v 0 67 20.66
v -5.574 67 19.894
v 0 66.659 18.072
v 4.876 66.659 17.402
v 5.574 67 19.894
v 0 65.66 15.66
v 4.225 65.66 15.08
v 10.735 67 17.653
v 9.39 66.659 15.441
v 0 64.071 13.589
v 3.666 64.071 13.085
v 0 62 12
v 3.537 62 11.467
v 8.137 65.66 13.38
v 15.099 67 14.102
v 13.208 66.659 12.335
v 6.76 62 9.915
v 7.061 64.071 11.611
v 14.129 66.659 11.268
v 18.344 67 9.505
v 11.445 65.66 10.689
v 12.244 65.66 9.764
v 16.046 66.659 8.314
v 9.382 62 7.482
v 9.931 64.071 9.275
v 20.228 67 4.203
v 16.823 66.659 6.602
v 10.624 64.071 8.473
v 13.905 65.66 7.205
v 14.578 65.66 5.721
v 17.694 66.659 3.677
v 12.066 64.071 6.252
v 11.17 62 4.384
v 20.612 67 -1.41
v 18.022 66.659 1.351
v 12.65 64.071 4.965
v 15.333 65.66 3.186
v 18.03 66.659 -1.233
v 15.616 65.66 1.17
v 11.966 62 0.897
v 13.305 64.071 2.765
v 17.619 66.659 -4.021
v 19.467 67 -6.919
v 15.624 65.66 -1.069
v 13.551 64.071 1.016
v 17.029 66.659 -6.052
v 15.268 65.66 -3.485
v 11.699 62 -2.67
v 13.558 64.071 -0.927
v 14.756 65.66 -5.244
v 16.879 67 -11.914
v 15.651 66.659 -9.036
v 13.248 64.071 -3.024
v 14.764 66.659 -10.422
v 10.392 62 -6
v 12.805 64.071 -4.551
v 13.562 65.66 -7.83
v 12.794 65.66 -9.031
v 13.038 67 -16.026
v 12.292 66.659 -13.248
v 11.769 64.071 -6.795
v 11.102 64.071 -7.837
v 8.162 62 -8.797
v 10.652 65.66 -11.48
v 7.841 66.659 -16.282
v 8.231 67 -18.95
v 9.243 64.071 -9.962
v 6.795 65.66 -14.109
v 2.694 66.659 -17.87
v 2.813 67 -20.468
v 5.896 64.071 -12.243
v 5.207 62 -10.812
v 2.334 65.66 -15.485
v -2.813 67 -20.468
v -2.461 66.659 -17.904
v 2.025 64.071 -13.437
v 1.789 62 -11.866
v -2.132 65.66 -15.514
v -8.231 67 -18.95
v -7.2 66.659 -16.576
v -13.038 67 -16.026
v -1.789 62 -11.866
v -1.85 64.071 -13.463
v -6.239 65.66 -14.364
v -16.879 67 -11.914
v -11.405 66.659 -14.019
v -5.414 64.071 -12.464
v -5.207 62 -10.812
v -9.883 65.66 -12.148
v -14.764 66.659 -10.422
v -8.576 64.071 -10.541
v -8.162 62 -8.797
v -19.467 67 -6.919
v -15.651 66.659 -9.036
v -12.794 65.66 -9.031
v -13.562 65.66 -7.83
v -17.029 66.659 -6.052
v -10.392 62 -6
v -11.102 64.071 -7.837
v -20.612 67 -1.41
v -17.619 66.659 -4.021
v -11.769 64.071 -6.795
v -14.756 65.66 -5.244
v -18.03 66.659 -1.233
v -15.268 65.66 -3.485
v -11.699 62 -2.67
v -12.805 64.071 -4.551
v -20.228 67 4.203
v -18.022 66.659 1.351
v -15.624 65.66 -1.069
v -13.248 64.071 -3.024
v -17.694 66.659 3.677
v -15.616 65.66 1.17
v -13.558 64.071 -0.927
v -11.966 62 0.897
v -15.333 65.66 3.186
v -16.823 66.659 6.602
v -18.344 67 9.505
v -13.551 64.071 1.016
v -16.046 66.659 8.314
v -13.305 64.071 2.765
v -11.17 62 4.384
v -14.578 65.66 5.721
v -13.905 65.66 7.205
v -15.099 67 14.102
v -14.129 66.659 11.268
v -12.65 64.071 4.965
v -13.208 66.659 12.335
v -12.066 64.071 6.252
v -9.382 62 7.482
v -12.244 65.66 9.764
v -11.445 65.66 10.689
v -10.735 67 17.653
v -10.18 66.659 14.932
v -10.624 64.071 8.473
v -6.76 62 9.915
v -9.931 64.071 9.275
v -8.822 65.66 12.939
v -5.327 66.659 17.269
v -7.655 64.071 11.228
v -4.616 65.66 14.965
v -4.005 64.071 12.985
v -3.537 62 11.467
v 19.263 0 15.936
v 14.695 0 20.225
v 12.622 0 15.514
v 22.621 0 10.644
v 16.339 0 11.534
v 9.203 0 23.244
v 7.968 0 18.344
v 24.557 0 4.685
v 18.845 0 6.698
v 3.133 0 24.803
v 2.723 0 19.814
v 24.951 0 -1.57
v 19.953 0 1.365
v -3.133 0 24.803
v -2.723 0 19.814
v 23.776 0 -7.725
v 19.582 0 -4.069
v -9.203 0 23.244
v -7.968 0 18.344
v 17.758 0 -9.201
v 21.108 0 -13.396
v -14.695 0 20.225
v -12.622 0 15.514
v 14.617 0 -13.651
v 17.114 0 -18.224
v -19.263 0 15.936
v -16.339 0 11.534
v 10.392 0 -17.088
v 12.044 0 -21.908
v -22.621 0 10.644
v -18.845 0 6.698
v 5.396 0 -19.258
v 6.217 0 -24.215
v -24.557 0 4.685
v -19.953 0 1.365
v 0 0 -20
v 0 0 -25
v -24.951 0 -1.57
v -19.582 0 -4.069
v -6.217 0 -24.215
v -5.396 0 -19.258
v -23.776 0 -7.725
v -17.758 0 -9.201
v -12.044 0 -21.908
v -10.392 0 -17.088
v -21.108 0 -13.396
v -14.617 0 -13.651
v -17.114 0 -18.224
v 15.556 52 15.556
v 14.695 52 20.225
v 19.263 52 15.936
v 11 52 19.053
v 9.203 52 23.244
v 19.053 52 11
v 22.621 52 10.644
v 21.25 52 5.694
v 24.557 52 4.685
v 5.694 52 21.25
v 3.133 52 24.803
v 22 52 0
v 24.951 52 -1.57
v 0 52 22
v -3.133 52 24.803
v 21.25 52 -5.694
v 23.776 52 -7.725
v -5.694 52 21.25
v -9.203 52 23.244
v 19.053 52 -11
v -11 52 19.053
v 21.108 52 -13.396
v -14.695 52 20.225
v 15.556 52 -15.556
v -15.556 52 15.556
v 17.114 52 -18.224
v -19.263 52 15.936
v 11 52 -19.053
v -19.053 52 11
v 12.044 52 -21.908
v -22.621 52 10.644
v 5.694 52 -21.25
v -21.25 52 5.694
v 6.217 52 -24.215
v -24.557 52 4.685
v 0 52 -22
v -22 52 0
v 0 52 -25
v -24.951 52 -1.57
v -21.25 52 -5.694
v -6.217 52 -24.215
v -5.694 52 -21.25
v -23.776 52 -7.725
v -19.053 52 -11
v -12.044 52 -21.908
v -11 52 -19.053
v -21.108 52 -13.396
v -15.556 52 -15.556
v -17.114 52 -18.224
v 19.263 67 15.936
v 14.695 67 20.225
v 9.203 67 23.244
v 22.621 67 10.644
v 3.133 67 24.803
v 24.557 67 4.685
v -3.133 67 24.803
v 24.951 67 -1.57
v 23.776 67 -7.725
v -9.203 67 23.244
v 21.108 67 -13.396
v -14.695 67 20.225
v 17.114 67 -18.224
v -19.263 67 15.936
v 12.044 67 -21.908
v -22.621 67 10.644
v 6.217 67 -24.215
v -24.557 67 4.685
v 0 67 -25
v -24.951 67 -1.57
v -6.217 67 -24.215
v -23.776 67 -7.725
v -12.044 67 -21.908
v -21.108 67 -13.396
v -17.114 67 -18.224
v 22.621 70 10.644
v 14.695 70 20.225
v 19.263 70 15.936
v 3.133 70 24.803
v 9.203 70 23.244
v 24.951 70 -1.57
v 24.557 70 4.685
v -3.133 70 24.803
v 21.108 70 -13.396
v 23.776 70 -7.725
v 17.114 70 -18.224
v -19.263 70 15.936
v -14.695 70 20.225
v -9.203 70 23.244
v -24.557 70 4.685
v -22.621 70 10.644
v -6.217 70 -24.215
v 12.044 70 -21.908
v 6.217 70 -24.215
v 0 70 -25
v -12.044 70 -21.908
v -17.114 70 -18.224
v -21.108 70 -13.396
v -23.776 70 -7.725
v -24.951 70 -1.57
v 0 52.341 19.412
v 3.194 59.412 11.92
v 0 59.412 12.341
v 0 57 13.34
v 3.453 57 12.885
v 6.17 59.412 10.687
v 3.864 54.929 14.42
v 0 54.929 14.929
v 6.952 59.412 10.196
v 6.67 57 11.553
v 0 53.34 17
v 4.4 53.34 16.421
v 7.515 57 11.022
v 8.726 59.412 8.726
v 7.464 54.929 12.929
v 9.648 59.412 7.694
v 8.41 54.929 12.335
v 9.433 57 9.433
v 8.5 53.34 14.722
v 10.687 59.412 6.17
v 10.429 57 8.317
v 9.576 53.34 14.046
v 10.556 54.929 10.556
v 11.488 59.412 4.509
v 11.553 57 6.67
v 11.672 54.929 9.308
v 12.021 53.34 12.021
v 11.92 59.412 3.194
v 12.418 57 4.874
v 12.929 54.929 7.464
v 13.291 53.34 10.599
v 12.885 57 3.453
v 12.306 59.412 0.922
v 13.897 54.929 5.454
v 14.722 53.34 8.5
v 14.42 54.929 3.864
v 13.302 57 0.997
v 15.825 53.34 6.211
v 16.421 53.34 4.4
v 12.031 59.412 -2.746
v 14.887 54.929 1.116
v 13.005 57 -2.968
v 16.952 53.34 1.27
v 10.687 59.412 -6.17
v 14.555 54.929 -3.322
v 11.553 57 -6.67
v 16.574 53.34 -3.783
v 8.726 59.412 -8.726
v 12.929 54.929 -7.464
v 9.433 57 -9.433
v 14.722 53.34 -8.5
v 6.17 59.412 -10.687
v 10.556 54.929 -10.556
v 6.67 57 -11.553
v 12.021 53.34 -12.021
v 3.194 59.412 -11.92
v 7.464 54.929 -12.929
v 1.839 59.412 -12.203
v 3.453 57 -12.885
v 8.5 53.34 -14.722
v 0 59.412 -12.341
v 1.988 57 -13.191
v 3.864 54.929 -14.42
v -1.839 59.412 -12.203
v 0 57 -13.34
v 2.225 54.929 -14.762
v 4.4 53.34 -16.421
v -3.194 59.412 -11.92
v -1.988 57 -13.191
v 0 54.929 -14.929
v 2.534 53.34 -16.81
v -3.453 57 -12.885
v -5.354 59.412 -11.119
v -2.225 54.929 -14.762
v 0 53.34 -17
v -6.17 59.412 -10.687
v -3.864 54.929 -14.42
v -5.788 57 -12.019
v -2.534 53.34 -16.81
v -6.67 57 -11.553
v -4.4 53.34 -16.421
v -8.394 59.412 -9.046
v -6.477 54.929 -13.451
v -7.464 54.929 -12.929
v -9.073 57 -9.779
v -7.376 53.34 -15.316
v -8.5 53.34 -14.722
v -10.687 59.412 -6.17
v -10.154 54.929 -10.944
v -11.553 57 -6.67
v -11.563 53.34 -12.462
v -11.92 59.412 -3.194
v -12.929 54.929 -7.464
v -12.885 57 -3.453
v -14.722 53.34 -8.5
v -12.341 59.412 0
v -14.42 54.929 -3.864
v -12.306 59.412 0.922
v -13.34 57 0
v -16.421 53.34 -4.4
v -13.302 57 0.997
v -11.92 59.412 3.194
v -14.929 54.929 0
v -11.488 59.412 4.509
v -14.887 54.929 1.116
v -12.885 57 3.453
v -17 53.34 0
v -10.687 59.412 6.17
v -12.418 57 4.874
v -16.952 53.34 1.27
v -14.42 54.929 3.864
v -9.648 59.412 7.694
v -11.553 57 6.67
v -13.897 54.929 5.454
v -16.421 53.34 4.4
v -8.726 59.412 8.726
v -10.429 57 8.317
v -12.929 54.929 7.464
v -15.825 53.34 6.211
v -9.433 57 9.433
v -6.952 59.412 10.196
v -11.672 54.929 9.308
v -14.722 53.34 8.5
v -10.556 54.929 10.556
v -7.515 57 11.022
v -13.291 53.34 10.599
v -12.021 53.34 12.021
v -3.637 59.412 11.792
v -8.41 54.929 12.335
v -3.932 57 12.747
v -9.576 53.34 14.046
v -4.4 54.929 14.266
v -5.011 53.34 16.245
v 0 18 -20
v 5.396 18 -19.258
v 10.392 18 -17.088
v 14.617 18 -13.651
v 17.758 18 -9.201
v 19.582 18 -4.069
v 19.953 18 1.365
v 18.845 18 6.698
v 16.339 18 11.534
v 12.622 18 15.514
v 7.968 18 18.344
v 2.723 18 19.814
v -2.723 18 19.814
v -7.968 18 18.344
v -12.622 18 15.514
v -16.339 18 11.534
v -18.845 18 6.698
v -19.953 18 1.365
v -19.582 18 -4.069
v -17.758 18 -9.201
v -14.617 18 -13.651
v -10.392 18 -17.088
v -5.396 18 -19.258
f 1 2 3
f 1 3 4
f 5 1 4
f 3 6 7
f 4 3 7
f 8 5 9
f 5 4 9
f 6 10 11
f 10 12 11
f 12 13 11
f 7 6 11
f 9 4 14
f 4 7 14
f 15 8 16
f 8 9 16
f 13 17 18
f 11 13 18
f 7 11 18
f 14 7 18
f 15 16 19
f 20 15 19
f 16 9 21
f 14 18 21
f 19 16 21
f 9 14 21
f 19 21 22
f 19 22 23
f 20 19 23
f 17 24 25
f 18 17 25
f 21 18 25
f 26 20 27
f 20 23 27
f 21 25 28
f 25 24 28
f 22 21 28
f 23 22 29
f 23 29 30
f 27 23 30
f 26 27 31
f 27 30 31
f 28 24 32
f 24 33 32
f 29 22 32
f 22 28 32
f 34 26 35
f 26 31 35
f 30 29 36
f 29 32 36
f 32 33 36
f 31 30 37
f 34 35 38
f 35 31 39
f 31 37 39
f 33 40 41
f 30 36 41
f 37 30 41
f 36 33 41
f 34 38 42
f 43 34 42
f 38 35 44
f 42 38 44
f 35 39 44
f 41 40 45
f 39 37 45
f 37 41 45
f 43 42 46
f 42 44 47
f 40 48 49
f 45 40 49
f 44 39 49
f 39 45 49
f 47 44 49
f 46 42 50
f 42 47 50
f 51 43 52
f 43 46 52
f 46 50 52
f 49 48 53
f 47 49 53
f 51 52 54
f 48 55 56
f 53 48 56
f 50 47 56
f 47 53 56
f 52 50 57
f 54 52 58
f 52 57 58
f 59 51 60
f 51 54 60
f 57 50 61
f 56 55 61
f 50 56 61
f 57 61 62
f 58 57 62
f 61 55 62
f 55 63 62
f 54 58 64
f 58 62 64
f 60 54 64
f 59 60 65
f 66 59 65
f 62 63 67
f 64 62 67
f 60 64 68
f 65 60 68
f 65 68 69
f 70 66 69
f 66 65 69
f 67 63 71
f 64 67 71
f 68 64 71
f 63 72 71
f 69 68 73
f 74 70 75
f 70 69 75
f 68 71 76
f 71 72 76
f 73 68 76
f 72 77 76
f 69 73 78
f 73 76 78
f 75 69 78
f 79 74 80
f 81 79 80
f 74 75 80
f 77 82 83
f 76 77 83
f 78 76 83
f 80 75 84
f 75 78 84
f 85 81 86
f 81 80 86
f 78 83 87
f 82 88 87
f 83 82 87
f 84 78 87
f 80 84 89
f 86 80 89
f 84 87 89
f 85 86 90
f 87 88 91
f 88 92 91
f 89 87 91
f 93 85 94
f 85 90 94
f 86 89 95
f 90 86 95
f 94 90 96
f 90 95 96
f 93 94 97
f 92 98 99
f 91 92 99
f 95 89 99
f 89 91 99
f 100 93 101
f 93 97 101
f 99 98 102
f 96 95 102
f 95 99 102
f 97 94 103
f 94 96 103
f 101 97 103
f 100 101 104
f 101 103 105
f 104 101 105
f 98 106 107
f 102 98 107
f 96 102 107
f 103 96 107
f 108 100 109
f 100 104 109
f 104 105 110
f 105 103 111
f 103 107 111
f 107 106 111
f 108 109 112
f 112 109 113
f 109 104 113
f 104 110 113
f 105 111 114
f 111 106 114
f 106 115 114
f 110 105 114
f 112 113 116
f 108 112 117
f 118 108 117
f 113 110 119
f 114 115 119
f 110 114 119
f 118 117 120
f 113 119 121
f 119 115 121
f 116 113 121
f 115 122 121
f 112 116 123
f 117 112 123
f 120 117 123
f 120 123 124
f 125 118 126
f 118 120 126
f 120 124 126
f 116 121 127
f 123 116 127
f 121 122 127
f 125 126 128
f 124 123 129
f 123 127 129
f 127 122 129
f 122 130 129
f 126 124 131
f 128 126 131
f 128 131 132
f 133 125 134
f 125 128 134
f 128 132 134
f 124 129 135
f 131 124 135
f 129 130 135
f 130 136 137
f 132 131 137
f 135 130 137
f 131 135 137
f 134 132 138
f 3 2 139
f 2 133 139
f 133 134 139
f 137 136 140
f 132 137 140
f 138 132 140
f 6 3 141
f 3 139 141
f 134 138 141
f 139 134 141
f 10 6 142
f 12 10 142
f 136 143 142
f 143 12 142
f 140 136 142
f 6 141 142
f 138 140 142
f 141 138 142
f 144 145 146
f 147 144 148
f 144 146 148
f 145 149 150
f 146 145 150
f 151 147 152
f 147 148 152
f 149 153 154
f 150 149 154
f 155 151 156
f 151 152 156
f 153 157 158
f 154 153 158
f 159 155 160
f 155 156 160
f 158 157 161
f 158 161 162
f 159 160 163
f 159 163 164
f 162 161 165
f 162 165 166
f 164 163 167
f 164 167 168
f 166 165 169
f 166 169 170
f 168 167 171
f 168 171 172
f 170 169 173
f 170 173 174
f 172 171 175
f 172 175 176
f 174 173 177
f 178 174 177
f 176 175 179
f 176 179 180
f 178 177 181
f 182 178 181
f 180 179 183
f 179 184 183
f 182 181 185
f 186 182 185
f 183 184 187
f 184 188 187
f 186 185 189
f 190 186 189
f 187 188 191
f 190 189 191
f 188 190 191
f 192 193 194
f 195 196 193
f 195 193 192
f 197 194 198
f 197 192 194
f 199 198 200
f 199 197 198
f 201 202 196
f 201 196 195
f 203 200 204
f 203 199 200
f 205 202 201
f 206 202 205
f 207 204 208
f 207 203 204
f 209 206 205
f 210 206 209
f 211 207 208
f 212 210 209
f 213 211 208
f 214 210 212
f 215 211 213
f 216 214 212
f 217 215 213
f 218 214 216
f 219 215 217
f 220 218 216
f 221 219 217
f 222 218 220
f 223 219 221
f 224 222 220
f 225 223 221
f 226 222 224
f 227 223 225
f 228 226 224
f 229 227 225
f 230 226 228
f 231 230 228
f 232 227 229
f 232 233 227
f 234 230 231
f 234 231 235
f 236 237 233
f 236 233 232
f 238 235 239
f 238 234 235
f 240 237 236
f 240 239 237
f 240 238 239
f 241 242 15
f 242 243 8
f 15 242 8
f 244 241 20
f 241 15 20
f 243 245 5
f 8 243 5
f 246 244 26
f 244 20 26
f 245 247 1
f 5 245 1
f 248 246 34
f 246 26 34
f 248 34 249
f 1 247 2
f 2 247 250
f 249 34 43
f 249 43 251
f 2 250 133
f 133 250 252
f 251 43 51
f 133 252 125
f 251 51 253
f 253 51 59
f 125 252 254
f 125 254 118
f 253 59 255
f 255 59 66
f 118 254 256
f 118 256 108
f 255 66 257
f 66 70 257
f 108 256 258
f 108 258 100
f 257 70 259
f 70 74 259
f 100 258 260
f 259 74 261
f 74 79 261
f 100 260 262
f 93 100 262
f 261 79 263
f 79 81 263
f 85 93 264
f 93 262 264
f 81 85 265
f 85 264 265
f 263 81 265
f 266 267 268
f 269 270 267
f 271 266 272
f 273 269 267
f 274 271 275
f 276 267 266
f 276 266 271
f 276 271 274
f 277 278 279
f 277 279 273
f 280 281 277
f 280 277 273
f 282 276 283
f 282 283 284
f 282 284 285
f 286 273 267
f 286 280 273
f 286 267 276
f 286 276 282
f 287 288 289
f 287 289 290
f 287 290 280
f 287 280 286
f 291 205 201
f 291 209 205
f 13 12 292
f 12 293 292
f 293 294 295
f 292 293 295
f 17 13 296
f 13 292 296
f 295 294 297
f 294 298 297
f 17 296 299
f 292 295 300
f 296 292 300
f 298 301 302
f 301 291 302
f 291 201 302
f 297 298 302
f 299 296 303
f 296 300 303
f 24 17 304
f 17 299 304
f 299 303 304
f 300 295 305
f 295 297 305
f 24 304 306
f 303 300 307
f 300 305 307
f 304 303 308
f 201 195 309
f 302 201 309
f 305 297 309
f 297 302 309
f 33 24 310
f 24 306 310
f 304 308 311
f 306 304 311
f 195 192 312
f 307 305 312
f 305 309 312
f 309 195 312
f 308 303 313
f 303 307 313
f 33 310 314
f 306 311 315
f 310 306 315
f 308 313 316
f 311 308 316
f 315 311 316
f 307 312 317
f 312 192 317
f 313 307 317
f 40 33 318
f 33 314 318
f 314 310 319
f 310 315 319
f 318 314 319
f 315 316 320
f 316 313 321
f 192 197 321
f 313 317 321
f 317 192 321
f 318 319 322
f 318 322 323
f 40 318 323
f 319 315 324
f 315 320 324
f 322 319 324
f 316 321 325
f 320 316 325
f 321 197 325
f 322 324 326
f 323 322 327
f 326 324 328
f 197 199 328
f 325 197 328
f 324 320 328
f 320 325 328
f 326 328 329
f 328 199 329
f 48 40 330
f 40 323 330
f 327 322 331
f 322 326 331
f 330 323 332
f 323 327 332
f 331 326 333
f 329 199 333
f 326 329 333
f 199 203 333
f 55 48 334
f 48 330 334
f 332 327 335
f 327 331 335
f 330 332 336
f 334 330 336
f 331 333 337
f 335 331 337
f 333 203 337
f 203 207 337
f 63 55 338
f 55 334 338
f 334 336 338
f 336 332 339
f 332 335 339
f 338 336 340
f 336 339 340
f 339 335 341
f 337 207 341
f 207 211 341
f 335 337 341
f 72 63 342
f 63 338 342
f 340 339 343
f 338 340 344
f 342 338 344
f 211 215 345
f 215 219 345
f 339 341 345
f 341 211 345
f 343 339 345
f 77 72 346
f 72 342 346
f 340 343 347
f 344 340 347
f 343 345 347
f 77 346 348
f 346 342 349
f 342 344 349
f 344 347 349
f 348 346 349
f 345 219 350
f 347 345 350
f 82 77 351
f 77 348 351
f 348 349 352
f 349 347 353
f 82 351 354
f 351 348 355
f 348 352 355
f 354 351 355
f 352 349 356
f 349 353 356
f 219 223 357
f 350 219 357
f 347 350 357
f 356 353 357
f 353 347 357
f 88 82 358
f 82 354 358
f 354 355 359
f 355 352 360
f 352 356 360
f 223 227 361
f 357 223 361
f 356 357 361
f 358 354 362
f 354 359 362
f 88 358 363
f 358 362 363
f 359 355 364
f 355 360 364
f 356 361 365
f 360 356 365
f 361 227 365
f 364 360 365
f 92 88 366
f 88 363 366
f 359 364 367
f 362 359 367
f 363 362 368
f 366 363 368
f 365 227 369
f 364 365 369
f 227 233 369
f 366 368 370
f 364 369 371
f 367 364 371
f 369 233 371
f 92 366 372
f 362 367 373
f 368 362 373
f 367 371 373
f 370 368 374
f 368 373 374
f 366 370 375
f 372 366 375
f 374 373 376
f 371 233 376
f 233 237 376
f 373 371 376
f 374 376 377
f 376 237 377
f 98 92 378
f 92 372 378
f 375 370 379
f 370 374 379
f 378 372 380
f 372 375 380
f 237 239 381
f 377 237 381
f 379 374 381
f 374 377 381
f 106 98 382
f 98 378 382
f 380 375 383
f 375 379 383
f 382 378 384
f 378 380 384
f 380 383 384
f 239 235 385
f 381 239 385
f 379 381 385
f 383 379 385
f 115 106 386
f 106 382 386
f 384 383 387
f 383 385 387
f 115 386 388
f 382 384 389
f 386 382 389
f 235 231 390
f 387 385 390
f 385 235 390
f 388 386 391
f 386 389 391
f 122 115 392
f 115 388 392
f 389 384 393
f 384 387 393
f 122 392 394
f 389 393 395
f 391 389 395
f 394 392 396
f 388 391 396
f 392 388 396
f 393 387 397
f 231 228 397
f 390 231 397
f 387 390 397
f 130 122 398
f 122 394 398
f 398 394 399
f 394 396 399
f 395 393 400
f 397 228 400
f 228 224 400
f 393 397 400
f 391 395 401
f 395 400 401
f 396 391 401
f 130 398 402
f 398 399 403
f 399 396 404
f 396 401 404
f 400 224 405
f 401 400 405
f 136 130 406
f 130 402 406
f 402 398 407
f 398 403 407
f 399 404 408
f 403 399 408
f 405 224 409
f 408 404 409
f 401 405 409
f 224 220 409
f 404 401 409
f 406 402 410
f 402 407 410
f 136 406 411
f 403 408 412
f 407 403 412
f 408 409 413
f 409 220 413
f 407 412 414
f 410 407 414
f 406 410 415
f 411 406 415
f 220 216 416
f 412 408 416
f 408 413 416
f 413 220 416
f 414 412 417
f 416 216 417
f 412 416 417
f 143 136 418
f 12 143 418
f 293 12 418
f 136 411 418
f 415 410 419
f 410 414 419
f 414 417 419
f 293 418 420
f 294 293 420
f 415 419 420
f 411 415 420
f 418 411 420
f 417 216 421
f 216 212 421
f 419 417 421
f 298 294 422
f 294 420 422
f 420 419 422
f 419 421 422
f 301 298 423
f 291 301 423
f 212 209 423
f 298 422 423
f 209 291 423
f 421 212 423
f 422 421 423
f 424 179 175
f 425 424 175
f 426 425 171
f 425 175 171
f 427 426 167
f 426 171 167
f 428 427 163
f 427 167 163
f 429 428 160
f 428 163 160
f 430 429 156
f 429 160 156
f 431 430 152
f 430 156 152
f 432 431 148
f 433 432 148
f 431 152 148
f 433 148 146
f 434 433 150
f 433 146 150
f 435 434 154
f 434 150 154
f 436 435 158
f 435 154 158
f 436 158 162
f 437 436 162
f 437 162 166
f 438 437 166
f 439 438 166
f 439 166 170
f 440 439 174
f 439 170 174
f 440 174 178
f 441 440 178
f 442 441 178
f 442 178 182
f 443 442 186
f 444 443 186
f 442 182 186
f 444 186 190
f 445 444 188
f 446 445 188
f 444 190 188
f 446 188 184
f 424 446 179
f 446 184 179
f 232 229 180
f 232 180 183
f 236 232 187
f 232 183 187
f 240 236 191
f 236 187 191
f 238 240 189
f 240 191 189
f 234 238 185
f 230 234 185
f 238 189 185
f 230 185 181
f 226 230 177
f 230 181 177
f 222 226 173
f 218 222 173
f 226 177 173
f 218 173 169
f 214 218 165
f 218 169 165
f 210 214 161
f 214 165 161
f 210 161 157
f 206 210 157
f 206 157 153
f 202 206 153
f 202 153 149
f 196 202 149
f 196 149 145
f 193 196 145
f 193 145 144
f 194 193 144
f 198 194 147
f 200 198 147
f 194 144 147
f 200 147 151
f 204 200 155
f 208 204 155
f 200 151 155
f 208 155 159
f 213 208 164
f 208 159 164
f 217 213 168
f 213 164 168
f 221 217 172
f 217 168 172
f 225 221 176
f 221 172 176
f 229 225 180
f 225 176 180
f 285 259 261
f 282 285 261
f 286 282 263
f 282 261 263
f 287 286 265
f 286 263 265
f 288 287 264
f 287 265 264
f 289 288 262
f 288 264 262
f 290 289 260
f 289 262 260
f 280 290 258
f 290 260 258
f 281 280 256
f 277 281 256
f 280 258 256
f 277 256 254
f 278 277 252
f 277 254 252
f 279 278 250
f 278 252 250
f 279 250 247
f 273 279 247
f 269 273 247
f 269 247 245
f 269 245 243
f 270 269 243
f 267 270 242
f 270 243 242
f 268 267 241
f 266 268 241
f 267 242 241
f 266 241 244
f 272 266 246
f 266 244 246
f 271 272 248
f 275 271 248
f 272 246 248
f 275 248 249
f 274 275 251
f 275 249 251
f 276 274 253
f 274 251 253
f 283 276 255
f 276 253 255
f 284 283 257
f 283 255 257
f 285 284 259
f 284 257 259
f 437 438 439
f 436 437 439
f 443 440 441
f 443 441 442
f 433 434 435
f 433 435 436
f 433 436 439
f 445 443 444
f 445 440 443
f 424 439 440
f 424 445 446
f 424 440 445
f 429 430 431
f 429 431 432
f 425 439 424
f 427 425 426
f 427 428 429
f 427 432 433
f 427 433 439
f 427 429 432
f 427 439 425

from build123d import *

# Parameters (mm, degrees)
SKETCH1_R           = 25
BOSS_EXTRUDE1_DEPTH = 52
SKETCH2_R           = 12
BOSS_EXTRUDE2_DEPTH = 15
SKETCH3_R           = 25
BOSS_EXTRUDE3_DEPTH = 3
FILLET1_R           = 10
FILLET2_R           = 10
SKETCH4_R           = 20
CUT_EXTRUDE1_DEPTH  = 18


with BuildPart() as part:
    # Sketch1 → Boss-Extrude1 (new body)
    with BuildSketch(Plane(origin=(0, 0, 0), x_dir=(1, 0, 0), z_dir=(0, 1, 0))):
        with Locations(Location((0, 0, 0), (0, 0, 90))):
            Circle(SKETCH1_R)
    extrude(amount=BOSS_EXTRUDE1_DEPTH)

    # Sketch2 → Boss-Extrude2 (add)
    with BuildSketch(Plane(origin=(0, 52, 0), x_dir=(1, 0, 0), z_dir=(0, 1, 0))):
        with Locations(Location((0, 0, 0), (0, 0, 270))):
            Circle(SKETCH2_R)
    extrude(amount=BOSS_EXTRUDE2_DEPTH)

    # Sketch3 → Boss-Extrude3 (add)
    with BuildSketch(Plane(origin=(0, 67, 0), x_dir=(1, 0, 0), z_dir=(0, 1, 0))):
        with Locations(Location((0, 0, 0), (0, 0, 90))):
            Circle(SKETCH3_R)
    extrude(amount=BOSS_EXTRUDE3_DEPTH)

    # Fillet1
    fillet1_edges = [part.edges().sort_by_distance(p)[0] for p in [
        (0, 52, -12),
    ]]
    fillet(fillet1_edges, radius=FILLET1_R)

    # Fillet2
    # the kernel refuses this fillet: 10 mm, written as the material it adds along each edge
    with BuildSketch(Plane(origin=(0, 67, 0), x_dir=(0, 0, 1), z_dir=(-1, 0, 0))) as fillet2_piece_1:
        with BuildLine():
            CenterArc((20.660254038, -10), FILLET2_R, 90, 60)
            Line((20.660254038, 0), (20.660254038, 0.2))
            Line((20.660254038, 0.2), (12, 0.2))
            Line((12, 0.2), (11.8, 0))
            ThreePointArc((11.8, 0), (11.8, -2.5), (11.826794919, -4.9))
            Line((11.826794919, -4.9), (12, -5))
        make_face()
    revolve(axis=Axis((0, 67, 0), (0, 1, 0)))

    # Sketch4 → Cut-Extrude1 (cut)
    with BuildSketch(Plane(origin=(0, 0, 0), x_dir=(-1, 0, 0), z_dir=(0, -1, 0))):
        with Locations(Location((0, 0, 0), (0, 0, 90))):
            Circle(SKETCH4_R)
    extrude(amount=-CUT_EXTRUDE1_DEPTH, mode=Mode.SUBTRACT)


solid = part.part
